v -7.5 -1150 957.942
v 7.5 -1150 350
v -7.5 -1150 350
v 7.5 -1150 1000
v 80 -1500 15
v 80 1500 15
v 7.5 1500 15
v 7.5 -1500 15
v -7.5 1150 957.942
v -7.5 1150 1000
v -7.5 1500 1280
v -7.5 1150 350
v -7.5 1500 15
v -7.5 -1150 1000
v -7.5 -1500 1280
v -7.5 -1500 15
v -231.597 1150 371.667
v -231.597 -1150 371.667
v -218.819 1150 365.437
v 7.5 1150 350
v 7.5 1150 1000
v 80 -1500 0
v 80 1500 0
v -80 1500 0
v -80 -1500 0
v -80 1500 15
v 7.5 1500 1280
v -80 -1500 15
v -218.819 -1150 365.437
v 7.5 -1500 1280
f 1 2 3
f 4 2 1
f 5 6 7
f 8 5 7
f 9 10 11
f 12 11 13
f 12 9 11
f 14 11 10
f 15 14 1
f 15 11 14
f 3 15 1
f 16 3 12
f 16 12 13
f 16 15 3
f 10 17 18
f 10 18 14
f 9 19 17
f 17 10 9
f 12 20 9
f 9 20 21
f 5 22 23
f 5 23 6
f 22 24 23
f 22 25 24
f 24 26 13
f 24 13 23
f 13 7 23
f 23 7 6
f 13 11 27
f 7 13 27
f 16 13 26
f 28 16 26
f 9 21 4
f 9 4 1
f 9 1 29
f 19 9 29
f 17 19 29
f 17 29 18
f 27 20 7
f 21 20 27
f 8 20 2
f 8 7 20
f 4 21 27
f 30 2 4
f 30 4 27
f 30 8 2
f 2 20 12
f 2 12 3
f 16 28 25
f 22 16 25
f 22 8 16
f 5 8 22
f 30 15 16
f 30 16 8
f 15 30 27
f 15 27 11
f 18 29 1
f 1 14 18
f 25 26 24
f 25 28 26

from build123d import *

# Parameters (mm, degrees)
PAD014_DEPTH    = 1500
SKETCH022_W     = 650
SKETCH022_H     = 2300
POCKET005_DEPTH = 87.501
PAD015_DEPTH    = 2300


with BuildPart() as part:
    # Sketch024 → Pad014 (new body, symmetric)
    with BuildSketch(Plane.XZ):
        Polygon((-80, 0), (80, 0), (80, 15), (7.5, 15), (7.5, 1280), (-7.5, 1280), (-7.5, 15), (-80, 15), align=None)
    extrude(amount=PAD014_DEPTH, both=True)

    # Sketch022 (on Face6 of Pad014) → Pocket005 (cut, through all)
    with BuildSketch(Plane(origin=(7.5, 0, 0), x_dir=(0, 0, 1), z_dir=(1, 0, 0))):
        with Locations((675, 0)):
            Rectangle(SKETCH022_W, SKETCH022_H)
    extrude(amount=-POCKET005_DEPTH, mode=Mode.SUBTRACT)

    # Sketch023 (on Face8 of Pocket005) → Pad015 (join)
    with BuildSketch(Plane.XZ.offset(-1150)):
        Polygon((-7.5, 1000), (7.5, 1000), (-218.819013, 365.436732), (-231.59712, 371.666577), align=None)
    extrude(amount=PAD015_DEPTH)


solid = part.part
